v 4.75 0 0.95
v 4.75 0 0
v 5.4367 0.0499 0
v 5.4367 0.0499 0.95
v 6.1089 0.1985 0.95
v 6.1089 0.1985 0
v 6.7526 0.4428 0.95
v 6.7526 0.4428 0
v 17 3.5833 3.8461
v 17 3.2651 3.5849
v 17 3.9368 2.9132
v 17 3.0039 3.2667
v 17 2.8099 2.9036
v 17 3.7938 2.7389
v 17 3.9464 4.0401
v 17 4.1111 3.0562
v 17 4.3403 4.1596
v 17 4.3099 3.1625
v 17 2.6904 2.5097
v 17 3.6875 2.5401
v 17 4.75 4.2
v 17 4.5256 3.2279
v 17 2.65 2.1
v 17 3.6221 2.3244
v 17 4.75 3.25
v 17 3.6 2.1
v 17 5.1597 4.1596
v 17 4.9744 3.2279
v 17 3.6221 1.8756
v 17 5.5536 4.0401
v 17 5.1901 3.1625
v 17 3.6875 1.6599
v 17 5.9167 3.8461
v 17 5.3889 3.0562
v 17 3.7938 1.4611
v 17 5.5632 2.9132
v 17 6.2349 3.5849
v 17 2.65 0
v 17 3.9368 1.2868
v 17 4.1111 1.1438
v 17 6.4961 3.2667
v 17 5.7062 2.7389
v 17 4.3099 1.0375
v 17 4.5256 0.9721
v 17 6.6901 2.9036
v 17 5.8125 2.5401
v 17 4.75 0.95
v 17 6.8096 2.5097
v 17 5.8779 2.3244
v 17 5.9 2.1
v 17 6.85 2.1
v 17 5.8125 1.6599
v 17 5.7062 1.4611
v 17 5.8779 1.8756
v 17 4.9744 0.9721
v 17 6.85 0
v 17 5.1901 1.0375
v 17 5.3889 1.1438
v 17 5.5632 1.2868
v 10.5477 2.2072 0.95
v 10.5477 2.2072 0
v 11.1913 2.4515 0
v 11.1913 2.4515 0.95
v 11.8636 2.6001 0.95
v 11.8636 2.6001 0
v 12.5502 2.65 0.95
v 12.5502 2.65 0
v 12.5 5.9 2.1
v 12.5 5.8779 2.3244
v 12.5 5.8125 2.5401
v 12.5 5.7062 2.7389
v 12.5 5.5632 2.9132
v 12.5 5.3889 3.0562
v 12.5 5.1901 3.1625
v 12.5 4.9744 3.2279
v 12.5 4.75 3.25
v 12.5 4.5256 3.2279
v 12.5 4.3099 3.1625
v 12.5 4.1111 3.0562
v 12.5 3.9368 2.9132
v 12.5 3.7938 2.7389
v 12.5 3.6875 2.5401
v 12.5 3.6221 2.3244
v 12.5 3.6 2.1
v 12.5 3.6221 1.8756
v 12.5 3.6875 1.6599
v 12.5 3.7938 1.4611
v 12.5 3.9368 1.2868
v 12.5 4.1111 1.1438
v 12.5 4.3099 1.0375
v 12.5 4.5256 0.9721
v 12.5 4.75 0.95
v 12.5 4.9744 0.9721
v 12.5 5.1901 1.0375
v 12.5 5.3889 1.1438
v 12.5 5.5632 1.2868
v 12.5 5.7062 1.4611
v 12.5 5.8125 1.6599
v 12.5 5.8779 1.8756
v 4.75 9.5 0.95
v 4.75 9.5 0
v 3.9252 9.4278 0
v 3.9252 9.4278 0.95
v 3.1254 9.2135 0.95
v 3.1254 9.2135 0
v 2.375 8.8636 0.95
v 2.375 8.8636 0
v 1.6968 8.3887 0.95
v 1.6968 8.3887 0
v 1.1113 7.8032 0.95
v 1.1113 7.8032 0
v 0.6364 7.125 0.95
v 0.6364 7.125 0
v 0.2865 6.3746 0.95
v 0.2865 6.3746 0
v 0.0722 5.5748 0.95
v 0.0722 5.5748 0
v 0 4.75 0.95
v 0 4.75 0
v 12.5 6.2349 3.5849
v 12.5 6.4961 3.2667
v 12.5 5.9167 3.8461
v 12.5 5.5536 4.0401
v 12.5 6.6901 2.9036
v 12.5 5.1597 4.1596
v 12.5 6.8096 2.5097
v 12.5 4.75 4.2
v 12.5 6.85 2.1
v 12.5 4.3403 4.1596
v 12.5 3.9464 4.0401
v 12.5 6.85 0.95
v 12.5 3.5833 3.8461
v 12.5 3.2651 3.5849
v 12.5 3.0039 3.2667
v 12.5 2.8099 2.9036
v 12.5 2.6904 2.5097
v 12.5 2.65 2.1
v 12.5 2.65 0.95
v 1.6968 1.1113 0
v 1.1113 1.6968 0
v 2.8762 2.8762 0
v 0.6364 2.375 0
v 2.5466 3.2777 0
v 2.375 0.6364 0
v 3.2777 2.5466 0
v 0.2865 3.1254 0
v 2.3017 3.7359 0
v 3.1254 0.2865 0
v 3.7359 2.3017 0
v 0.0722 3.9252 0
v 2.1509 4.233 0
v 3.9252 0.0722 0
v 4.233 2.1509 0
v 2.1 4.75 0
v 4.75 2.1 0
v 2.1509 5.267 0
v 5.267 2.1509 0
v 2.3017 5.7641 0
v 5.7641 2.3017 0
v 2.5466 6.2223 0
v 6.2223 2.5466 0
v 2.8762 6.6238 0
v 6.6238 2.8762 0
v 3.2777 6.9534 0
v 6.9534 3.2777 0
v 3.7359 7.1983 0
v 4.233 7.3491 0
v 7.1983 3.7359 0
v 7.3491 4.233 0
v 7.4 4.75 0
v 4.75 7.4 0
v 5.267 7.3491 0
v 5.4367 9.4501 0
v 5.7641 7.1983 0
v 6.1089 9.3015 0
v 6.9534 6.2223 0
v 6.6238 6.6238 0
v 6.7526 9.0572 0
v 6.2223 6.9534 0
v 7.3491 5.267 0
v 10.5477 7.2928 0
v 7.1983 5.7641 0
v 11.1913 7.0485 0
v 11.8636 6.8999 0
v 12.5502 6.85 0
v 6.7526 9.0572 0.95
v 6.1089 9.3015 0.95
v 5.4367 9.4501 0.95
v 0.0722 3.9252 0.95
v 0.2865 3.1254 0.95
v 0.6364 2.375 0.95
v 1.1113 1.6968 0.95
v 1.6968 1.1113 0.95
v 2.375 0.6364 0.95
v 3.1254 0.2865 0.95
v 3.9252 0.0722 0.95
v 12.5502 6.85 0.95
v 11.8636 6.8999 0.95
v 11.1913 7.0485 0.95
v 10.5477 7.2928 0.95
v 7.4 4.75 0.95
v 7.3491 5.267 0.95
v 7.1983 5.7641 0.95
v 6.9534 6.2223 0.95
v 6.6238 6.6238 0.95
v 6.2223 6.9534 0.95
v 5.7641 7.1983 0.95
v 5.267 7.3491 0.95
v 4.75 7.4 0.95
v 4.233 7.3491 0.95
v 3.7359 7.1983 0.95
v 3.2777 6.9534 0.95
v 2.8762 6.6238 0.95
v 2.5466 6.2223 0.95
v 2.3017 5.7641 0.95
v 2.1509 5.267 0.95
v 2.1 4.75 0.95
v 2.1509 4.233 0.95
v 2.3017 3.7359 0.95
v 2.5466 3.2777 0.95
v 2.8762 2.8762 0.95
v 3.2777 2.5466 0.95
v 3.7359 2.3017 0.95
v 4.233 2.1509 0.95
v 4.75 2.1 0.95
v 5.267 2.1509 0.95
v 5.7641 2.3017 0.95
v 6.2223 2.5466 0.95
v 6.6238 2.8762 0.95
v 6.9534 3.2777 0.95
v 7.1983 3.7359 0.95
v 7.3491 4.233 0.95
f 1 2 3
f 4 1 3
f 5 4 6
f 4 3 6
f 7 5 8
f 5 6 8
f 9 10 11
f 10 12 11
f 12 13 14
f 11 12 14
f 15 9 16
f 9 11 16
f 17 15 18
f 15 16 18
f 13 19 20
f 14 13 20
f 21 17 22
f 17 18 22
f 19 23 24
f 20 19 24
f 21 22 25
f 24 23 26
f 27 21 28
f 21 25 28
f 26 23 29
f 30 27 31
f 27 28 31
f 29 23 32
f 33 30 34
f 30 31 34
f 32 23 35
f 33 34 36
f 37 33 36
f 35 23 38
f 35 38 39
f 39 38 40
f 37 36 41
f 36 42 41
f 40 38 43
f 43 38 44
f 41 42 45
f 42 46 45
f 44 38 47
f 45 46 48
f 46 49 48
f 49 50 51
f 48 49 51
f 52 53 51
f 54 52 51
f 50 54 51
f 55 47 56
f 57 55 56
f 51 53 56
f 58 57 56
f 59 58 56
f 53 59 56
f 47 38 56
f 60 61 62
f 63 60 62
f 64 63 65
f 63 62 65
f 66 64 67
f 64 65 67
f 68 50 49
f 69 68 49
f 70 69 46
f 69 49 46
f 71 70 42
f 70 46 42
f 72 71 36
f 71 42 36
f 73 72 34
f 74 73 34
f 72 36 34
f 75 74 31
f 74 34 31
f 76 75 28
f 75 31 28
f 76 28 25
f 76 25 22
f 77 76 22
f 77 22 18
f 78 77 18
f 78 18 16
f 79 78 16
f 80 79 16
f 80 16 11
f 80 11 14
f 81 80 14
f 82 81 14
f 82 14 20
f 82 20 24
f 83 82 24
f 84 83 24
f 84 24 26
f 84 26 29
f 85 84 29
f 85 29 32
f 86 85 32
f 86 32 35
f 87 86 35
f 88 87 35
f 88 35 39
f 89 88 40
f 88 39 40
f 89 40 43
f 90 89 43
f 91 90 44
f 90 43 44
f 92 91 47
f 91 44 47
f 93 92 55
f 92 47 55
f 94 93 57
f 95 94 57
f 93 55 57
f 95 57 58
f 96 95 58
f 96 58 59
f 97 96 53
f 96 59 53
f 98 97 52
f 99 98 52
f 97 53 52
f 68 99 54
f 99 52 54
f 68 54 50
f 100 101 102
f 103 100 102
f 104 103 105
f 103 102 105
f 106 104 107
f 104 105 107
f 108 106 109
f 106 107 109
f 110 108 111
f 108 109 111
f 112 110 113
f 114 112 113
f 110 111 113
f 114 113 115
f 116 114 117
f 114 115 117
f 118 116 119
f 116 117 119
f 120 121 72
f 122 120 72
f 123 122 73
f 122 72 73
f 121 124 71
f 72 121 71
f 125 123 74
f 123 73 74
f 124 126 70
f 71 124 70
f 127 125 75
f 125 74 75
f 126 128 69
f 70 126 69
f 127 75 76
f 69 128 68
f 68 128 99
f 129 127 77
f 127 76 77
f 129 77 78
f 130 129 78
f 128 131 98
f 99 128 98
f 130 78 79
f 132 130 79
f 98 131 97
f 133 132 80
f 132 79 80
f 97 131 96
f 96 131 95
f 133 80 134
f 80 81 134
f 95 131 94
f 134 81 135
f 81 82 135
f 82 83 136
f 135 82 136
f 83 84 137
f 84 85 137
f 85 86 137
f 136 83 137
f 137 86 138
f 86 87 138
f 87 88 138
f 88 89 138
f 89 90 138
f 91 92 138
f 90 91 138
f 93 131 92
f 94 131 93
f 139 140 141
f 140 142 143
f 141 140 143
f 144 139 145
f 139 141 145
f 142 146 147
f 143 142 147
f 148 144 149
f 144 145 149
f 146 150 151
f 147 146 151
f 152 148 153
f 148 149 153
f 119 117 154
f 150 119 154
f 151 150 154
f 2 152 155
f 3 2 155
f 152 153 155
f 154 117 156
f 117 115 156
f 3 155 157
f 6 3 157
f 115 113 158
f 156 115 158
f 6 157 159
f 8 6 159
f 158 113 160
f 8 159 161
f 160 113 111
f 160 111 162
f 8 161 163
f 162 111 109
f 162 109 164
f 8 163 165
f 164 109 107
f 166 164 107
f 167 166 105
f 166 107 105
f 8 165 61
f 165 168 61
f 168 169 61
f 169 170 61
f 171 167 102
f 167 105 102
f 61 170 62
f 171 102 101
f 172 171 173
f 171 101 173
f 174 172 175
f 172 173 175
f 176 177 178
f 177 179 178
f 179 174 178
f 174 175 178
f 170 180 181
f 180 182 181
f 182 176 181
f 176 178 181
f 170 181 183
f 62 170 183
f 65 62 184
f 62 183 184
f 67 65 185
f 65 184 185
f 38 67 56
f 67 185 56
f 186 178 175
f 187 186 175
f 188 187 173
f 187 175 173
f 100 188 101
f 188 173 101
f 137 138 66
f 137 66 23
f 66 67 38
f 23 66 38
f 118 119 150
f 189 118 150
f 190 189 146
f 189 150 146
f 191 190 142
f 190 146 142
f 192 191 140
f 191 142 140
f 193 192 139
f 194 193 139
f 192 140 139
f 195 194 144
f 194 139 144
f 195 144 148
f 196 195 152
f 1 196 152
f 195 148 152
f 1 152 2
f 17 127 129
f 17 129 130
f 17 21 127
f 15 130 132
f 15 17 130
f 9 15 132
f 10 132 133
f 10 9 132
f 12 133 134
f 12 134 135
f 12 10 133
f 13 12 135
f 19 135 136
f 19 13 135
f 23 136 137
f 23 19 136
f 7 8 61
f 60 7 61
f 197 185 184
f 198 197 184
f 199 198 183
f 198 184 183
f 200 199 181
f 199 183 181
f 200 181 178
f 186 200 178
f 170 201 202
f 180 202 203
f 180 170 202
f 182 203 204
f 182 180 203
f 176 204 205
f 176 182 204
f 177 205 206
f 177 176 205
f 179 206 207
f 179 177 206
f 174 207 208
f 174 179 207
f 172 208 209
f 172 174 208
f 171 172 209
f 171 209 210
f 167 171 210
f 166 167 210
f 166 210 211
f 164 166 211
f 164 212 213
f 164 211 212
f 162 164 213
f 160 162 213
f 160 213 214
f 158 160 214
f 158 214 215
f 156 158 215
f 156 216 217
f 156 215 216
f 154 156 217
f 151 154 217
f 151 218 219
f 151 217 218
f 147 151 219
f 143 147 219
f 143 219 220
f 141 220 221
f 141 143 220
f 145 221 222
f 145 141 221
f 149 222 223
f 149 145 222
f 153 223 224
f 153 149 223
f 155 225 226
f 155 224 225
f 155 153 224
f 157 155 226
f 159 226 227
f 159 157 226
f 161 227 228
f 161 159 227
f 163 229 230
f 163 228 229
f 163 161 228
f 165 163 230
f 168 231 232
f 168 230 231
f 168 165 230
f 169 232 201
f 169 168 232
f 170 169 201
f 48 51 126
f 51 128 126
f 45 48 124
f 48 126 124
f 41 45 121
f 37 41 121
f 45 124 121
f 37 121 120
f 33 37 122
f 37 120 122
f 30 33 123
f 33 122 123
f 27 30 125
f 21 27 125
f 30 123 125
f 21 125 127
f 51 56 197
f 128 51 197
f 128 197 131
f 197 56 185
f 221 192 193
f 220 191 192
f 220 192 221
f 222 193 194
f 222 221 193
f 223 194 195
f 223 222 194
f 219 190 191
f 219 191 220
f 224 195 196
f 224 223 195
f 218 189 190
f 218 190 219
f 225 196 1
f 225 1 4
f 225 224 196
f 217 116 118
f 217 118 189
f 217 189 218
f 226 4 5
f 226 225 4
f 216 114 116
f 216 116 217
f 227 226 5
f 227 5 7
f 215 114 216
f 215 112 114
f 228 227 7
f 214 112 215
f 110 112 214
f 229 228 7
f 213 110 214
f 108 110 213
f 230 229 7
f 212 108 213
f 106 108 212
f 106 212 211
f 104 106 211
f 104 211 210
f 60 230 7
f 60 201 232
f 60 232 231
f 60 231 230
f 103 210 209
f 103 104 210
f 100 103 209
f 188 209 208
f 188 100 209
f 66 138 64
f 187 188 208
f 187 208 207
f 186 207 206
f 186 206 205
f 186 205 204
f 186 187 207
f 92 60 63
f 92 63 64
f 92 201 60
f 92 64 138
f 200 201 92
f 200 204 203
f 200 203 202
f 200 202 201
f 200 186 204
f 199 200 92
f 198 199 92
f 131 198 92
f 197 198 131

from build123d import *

# Parameters (mm, degrees)
F0_R     = 2.65
F1_DEPTH = 0.95
F3_DEPTH = 3.25
F4_R     = 2.09999
F5_R     = 1.15
F6_DEPTH = 25


# Not quite as in the source:
# - a fillet or chamfer is up to 0.001 mm smaller than in the source, because OpenCascade refuses the exact size


with BuildPart() as f1:
    # F0 (on Top) → F1 (new body)
    with BuildSketch(Plane.XY):
        with BuildLine():
            Line((12.5502312096, 2.65), (17, 2.65))
            Line((17, 2.65), (17, 6.85))
            Line((17, 6.85), (12.5502312096, 6.85))
            ThreePointArc((12.5502312096, 6.85), (11.5247662629, 6.9620131907), (10.5476657796, 7.2927698345))
            Line((10.5476657796, 7.2927698345), (6.75256543, 9.0572301655))
            ThreePointArc((6.75256543, 9.0572301655), (5.7754649467, 9.3879868093), (4.75, 9.5))
            ThreePointArc((4.75, 9.5), (1.3912427894, 8.1087572106), (0, 4.75))
            ThreePointArc((0, 4.75), (1.3912427894, 1.3912427894), (4.75, 0))
            ThreePointArc((4.75, 0), (5.7754649467, 0.1120131907), (6.75256543, 0.4427698345))
            Line((6.75256543, 0.4427698345), (10.5476657796, 2.2072301655))
            ThreePointArc((10.5476657796, 2.2072301655), (11.5247662629, 2.5379868093), (12.5502312096, 2.65))
        make_face()
        with Locations((4.75, 4.75)):
            Circle(F0_R, mode=Mode.SUBTRACT)
    extrude(amount=F1_DEPTH)

    # F2 (on face) → F3 (join)
    with BuildSketch(Plane.XY.offset(0.95)):
        Polygon((17, 2.65), (17, 6.85), (12.5502312096, 6.85), (12.5, 6.85), (12.5, 2.65), (12.5502312096, 2.65), align=None)
    extrude(amount=F3_DEPTH)

    # F4 (radius 2.1 in the source; OpenCascade refuses exactly that, so slightly less here)
    f4_edges = [f1.edges().sort_by_distance(p)[0] for p in [
        (14.75, 6.85, 4.2),
        (14.75, 2.65, 4.2),
    ]]
    fillet(f4_edges, radius=F4_R)

    # F5 (on face) → F6 (cut)
    with BuildSketch(Plane.YZ.offset(17)):
        with Locations((4.75, 2.1)):
            Circle(F5_R)
    extrude(amount=-F6_DEPTH, mode=Mode.SUBTRACT)


solid = f1.part
